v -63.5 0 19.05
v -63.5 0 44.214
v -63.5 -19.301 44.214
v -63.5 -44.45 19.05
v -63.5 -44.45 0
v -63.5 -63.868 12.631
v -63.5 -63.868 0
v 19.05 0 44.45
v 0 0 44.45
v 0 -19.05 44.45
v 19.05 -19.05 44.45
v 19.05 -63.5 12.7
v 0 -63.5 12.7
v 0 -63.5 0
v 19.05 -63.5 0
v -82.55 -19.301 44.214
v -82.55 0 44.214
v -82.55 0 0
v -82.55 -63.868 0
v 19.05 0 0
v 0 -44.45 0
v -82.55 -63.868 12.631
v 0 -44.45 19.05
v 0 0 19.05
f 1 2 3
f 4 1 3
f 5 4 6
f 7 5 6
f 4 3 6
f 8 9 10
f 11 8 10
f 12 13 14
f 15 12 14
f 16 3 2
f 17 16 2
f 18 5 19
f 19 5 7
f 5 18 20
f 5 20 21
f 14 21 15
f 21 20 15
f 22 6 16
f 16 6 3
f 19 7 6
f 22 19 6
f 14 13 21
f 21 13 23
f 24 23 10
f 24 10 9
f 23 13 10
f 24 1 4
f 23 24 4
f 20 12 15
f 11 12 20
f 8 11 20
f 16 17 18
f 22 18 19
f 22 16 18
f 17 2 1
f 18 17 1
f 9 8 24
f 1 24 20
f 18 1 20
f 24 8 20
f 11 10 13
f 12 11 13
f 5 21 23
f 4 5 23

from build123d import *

# Parameters (mm, degrees)
F1_DEPTH = 19.05
F2_W     = 44.45
F2_H     = 19.05
F3_DEPTH = 63.5
F5_DEPTH = 19.05


with BuildPart() as f1:
    # F0 (on Right) → F1 (new body)
    with BuildSketch(Plane.YZ):
        Polygon((-63.5, 0), (0, 0), (0, 44.45), (-19.05, 44.45), (-63.5, 12.7), align=None)
    extrude(amount=F1_DEPTH)

    # F2 (on face) → F3 (join)
    with BuildSketch(Plane(origin=(0, 0, 0), x_dir=(0, -1, 0), z_dir=(-1, 0, 0))):
        with Locations((22.225, 9.525)):
            Rectangle(F2_W, F2_H)
    extrude(amount=F3_DEPTH)

    # F4 (on face) → F5 (join)
    with BuildSketch(Plane(origin=(-63.5, 0, 0), x_dir=(0, -1, 0), z_dir=(-1, 0, 0))):
        Polygon((0, 44.214059), (0, 0), (63.867629, 0), (63.867629, 12.631163), (19.30066, 44.214059), align=None)
    extrude(amount=F5_DEPTH)


solid = f1.part
